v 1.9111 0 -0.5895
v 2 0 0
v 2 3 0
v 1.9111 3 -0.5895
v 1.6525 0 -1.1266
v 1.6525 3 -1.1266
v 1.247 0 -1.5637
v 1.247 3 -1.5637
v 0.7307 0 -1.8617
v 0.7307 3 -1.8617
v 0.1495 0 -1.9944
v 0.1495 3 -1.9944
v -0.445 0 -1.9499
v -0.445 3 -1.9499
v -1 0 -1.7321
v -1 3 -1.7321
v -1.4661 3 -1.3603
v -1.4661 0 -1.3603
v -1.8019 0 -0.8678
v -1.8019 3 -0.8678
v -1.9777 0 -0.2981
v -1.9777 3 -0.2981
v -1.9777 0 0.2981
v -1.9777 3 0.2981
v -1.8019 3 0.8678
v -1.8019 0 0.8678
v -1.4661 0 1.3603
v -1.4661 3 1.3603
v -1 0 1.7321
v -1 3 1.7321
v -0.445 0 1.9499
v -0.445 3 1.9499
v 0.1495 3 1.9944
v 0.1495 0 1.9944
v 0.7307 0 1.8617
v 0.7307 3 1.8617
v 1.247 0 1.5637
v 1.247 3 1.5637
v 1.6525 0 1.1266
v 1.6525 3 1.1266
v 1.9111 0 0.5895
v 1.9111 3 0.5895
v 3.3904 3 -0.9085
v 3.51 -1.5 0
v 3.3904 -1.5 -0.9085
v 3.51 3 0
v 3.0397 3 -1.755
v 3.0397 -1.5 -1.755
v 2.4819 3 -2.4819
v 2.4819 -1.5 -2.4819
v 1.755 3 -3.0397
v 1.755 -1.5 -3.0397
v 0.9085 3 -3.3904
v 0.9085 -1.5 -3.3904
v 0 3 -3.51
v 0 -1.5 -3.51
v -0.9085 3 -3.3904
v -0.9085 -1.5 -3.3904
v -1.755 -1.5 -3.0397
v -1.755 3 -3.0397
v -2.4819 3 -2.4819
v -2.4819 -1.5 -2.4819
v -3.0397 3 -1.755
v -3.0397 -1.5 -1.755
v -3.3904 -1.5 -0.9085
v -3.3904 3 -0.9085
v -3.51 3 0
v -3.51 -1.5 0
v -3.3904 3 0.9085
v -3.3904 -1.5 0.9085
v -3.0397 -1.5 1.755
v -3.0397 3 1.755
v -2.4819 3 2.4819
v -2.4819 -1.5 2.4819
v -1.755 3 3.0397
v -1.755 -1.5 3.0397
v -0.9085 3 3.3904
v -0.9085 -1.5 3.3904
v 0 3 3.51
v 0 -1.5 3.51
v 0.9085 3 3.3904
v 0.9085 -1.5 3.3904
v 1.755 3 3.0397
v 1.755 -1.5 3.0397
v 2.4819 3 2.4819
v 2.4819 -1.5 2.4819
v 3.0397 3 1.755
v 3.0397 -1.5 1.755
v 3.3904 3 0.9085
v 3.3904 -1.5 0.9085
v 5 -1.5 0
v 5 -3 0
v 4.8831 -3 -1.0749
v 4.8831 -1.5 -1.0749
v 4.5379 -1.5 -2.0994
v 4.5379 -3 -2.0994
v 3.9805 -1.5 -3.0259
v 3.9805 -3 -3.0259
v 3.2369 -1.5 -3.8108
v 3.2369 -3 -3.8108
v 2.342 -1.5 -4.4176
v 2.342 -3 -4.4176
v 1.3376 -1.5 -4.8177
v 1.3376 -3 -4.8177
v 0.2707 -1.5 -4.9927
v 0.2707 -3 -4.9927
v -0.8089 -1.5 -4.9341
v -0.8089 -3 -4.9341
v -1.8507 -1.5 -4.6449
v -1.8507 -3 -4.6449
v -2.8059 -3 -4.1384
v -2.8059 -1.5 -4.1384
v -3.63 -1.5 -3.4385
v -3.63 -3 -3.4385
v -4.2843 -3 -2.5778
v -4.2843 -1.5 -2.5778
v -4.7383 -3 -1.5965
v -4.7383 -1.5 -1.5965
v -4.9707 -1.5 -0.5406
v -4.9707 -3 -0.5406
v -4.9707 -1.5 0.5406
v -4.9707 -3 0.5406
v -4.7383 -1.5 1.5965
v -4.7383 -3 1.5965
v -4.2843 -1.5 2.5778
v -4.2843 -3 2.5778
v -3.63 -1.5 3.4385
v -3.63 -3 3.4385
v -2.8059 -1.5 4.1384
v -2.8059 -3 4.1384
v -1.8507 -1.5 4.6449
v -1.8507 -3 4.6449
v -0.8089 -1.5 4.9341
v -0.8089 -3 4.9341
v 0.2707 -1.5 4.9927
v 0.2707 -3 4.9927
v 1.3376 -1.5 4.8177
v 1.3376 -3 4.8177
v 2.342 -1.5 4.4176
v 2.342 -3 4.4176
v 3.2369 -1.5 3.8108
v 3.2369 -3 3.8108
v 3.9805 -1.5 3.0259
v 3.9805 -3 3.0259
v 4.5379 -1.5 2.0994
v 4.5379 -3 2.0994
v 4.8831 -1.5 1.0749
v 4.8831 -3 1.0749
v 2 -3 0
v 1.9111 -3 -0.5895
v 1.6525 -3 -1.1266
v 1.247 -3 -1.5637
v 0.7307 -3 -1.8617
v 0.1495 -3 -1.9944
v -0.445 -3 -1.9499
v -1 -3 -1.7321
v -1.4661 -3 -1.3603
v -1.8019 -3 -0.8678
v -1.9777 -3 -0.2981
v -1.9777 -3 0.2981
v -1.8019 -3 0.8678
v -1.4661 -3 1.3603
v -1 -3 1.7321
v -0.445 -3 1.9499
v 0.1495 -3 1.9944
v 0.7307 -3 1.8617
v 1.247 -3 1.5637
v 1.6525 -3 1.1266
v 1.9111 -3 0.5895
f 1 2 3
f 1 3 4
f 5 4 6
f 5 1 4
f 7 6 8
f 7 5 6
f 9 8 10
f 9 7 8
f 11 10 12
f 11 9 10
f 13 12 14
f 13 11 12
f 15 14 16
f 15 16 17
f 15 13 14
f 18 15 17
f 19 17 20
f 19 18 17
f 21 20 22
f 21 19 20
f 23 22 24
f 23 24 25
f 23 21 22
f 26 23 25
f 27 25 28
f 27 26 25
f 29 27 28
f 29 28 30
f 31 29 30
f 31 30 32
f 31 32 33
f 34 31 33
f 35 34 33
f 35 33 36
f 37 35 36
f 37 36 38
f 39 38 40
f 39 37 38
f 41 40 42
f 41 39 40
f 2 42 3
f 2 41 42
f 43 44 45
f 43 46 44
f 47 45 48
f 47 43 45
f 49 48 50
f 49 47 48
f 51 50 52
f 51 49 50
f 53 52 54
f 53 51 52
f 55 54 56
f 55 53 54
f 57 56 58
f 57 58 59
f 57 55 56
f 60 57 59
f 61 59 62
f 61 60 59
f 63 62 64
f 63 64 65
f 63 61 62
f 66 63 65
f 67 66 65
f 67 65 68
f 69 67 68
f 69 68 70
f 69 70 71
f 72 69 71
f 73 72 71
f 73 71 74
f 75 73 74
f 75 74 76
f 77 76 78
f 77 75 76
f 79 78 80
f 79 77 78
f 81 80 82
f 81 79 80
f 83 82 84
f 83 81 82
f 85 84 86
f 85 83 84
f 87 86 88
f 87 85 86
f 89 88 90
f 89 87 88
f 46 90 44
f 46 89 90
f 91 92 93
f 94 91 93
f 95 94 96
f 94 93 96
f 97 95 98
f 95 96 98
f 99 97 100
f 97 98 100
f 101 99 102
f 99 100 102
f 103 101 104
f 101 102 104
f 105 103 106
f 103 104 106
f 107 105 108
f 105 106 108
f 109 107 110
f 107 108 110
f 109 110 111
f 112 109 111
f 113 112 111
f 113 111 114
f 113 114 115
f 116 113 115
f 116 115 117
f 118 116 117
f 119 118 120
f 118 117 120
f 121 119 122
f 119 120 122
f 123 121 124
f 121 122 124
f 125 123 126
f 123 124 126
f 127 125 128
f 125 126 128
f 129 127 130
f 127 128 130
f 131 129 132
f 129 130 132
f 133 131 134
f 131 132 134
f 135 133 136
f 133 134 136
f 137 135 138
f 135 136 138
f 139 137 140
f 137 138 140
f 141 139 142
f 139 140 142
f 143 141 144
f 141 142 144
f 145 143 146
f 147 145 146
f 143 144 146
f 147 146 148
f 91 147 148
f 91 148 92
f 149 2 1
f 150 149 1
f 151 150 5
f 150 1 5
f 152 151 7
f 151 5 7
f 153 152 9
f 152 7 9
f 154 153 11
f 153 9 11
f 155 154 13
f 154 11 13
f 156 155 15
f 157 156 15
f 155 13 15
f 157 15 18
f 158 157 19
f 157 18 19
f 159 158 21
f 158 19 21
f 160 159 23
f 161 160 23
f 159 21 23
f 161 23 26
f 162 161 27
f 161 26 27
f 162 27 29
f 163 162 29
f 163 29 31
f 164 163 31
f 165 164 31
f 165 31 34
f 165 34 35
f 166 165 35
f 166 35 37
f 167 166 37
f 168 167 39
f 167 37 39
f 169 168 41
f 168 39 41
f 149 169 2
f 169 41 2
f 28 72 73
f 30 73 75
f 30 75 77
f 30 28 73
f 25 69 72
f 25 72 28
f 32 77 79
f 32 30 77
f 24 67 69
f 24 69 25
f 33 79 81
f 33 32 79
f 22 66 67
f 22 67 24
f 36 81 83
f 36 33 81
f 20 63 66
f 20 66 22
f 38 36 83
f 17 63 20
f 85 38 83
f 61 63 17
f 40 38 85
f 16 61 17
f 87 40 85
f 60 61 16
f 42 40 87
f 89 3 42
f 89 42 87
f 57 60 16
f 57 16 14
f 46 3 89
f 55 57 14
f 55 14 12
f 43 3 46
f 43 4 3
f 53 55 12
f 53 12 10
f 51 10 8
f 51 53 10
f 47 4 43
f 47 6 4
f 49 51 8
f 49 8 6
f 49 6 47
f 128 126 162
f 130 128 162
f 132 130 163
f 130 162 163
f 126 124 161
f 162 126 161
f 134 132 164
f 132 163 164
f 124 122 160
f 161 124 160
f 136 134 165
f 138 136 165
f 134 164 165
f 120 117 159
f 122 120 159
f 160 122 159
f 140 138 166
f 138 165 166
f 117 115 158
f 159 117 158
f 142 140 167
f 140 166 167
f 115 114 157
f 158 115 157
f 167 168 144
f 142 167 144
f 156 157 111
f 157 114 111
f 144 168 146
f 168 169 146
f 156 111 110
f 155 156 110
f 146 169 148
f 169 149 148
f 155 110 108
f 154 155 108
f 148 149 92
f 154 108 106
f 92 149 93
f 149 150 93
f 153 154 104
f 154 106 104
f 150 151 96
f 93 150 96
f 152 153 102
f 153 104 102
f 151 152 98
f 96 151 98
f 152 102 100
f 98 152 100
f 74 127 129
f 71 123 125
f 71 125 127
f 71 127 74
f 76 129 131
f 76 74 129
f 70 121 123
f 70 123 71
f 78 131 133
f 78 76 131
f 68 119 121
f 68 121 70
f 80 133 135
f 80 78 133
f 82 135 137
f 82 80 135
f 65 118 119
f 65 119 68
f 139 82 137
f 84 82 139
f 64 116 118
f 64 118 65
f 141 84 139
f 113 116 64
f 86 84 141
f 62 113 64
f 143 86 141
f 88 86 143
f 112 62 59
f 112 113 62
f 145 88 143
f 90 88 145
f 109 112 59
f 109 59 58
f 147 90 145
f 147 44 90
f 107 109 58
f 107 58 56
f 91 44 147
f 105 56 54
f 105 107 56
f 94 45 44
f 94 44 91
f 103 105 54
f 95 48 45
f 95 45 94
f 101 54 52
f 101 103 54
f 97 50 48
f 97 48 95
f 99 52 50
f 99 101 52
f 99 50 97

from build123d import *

# Parameters (mm, degrees)
SKETCH5_R                = 3.51
SKETCH5_R_2              = 2
BOSS_EXTRUDE1_DEPTH      = 3
BOSS_EXTRUDE1_DEPTH_BACK = 3
BOSS_EXTRUDE2_START      = -3
SKETCH7_R                = 5
SKETCH7_R_2              = 3.51
BOSS_EXTRUDE2_DEPTH      = 1.5


with BuildPart() as part:
    # Sketch5 → Boss-Extrude1 (new body, two sides)
    with BuildSketch(Plane(origin=(0, 0, 0), x_dir=(1, 0, 0), z_dir=(0, 1, 0))) as boss_extrude1_sk:
        Circle(SKETCH5_R)
        Circle(SKETCH5_R_2, mode=Mode.SUBTRACT)
    extrude(amount=BOSS_EXTRUDE1_DEPTH)
    extrude(boss_extrude1_sk.sketch, amount=-BOSS_EXTRUDE1_DEPTH_BACK)

    # Sketch7 → Boss-Extrude2 (add)
    with BuildSketch(Plane(origin=(0, 0, 0), x_dir=(1, 0, 0), z_dir=(0, 1, 0)).offset(BOSS_EXTRUDE2_START)):
        Circle(SKETCH7_R)
        Circle(SKETCH7_R_2, mode=Mode.SUBTRACT)
    extrude(amount=BOSS_EXTRUDE2_DEPTH)


solid = part.part
